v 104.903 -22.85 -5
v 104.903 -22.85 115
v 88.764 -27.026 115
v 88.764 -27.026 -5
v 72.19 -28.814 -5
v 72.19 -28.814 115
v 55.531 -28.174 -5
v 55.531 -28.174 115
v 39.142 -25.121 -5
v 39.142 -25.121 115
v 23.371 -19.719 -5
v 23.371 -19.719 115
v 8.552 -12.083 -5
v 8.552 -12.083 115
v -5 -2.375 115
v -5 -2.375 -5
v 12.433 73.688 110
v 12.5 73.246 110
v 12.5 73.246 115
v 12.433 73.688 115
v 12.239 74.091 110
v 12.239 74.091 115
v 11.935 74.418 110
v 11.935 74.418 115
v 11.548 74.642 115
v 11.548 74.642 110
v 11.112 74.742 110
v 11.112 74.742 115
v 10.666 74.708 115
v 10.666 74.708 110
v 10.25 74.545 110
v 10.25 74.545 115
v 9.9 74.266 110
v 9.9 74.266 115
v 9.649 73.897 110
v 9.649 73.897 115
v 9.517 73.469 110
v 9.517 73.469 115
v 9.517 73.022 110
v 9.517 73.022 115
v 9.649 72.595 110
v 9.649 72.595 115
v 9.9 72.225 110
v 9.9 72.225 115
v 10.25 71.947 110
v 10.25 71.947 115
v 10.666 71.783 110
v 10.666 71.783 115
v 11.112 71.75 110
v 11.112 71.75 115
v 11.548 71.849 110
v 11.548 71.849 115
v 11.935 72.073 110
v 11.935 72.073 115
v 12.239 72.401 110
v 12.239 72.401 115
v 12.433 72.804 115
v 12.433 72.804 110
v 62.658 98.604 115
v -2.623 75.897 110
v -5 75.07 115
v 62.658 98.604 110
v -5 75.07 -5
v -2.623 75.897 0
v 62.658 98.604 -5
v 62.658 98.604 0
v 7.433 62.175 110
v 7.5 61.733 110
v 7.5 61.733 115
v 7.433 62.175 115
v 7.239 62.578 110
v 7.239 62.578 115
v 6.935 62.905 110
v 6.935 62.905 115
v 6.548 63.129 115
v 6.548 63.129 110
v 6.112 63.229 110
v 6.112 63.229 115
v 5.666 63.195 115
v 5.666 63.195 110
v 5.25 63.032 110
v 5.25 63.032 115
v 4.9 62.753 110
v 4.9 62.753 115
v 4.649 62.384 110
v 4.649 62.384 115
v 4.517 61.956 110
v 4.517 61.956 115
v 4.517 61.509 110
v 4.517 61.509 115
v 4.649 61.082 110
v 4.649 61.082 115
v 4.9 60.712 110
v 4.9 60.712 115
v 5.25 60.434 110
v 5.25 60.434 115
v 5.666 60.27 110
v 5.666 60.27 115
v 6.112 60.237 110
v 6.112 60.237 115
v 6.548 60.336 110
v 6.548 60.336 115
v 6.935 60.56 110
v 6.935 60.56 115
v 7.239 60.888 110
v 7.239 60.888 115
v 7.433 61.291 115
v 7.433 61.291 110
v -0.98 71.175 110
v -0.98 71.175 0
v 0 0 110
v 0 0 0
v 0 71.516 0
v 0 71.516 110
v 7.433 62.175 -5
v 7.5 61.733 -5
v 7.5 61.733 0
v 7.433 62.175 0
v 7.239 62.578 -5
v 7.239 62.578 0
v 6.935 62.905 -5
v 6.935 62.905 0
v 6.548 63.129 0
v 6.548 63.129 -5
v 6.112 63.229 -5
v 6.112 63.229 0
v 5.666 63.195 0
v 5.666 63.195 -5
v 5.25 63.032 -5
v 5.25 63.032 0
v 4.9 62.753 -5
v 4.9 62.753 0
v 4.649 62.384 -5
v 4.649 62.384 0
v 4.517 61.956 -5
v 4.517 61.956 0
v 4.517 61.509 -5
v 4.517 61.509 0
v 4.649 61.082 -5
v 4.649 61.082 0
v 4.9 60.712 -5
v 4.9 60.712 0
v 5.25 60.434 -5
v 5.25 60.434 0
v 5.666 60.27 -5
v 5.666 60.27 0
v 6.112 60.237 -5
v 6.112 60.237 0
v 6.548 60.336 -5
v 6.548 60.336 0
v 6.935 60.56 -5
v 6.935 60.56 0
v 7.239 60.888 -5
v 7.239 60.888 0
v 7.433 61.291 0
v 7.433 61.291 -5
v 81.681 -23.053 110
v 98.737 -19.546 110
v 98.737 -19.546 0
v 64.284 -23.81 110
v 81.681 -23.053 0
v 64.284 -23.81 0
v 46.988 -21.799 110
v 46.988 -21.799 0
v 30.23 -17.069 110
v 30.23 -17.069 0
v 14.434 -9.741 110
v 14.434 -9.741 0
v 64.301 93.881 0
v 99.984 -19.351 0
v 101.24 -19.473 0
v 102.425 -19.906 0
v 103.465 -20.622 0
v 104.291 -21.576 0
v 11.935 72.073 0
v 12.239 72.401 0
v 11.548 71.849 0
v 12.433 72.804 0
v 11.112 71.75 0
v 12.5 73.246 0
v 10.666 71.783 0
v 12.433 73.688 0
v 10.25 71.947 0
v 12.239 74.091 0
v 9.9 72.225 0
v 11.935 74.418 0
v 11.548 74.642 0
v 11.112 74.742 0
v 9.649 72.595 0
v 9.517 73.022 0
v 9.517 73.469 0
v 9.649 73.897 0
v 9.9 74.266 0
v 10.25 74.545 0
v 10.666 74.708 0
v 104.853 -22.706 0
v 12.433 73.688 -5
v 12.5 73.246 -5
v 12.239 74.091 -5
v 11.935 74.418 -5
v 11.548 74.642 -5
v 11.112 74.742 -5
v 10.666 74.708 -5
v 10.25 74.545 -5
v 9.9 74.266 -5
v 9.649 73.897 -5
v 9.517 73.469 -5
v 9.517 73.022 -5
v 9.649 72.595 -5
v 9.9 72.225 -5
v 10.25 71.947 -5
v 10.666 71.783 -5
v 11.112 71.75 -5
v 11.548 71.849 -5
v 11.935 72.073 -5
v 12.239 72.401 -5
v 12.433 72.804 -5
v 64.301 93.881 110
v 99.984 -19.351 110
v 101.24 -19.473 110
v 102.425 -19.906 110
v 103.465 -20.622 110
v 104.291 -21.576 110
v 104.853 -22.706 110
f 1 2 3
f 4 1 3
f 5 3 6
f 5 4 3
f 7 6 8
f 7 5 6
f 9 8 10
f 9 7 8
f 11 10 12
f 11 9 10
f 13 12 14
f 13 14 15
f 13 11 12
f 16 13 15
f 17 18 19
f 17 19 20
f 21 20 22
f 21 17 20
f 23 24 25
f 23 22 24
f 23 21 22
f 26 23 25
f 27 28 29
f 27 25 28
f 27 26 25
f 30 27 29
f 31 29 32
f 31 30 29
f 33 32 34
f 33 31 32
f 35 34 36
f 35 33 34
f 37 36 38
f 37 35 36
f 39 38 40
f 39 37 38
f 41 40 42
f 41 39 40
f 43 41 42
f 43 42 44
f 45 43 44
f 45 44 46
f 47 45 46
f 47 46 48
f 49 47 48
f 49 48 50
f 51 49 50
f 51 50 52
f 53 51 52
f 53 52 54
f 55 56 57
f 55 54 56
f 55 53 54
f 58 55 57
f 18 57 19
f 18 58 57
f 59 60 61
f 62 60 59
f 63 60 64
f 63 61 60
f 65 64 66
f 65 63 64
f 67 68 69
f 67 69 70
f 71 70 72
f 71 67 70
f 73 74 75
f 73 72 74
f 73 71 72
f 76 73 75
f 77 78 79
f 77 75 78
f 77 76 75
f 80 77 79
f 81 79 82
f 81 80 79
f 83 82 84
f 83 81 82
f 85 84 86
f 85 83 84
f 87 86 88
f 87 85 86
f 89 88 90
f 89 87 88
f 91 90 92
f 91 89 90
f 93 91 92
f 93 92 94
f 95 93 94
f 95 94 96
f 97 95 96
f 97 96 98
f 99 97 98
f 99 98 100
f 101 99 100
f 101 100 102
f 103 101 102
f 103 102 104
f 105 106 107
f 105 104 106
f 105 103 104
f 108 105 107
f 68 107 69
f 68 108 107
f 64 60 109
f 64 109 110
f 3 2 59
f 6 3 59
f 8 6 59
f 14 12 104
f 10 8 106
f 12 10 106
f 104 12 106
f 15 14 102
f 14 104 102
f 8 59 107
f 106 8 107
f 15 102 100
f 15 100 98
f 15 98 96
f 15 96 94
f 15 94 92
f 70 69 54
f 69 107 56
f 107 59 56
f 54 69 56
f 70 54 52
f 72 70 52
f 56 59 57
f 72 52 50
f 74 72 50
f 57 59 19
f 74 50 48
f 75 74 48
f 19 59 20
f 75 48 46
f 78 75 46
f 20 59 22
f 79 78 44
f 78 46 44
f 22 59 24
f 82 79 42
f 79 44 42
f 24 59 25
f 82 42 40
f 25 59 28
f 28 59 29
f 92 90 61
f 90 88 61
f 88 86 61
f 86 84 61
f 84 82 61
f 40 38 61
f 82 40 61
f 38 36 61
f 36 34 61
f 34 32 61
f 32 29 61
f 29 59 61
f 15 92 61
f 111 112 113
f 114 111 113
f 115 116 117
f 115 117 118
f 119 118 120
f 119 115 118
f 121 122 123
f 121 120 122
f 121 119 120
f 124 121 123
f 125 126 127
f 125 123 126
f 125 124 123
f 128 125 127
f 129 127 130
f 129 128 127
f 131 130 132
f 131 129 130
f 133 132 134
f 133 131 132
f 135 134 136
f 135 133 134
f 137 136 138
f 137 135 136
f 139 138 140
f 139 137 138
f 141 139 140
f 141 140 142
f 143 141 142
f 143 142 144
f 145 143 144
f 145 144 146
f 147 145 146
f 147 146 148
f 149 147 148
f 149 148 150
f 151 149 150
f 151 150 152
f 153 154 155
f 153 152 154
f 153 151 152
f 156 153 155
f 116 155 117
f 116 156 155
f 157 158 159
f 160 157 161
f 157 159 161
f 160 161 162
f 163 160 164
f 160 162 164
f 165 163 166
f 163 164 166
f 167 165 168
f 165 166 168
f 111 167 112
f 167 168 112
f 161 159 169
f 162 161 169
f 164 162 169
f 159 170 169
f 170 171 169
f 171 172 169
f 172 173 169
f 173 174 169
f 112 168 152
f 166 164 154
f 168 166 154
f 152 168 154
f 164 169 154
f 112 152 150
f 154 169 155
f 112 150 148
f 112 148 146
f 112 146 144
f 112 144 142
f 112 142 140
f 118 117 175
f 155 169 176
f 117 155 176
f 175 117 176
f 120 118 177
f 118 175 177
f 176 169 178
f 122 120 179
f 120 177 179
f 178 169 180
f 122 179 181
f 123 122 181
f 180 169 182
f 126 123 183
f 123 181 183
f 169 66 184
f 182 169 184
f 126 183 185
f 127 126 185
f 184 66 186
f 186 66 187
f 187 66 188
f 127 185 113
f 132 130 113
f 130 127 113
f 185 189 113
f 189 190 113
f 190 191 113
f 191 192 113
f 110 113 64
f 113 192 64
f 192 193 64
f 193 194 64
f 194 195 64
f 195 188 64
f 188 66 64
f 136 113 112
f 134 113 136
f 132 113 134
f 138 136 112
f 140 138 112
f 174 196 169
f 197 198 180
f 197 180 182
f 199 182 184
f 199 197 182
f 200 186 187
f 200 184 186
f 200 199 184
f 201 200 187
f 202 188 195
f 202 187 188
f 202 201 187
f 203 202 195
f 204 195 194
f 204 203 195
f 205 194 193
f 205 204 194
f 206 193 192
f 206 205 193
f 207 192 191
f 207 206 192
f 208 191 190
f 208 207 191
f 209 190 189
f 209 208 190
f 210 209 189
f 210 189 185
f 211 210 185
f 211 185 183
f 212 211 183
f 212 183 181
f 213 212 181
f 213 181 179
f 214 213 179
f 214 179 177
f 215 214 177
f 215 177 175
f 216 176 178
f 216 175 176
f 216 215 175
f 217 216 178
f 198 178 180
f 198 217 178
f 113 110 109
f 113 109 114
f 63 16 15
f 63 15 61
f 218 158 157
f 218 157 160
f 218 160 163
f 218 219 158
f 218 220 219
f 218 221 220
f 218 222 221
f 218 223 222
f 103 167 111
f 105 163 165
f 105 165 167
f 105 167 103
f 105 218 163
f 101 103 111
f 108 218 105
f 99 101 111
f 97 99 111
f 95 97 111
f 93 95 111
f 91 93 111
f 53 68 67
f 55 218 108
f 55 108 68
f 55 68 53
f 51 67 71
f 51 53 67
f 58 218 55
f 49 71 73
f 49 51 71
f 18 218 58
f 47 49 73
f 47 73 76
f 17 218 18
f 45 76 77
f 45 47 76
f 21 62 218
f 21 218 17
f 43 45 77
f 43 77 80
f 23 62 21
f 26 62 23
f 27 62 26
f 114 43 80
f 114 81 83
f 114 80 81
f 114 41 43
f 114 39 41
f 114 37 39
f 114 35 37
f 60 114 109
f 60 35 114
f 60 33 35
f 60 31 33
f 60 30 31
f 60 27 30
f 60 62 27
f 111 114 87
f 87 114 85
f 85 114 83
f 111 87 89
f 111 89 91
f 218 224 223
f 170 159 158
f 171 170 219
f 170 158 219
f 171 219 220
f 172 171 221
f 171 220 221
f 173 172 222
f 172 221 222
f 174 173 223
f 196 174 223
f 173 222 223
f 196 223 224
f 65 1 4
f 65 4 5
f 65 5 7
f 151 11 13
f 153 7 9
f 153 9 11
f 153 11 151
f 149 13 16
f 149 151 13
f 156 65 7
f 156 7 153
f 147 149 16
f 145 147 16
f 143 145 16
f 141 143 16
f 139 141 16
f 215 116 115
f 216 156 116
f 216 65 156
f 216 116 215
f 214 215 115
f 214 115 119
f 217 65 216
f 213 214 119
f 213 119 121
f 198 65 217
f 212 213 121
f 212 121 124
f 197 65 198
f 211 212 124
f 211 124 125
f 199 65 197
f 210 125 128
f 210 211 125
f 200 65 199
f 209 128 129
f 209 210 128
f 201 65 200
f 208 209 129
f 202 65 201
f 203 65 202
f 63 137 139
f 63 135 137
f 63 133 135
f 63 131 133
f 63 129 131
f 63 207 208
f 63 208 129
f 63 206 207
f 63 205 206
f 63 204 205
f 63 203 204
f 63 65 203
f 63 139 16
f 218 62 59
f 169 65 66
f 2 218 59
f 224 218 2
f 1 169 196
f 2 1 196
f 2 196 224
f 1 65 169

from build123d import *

# Parameters (mm, degrees)
EXTRUDE_2_DEPTH          = 110
SHELL_5_T                = 5
SKETCH_2_W               = 69.117640956
SKETCH_2_H               = 110
CUT_EXTRUDE_2_DEPTH      = 5
CUT_EXTRUDE_5_DEPTH      = 188.422981916
CUT_EXTRUDE_5_DEPTH_BACK = 188.422981916
SKETCH_3_R               = 1.5
FILLET_2_R               = 5


with BuildPart() as part:
    # 草图1 → 凸台-拉伸2 (new body)
    with BuildSketch(Plane.XY):
        with BuildLine():
            Line((0, 0), (0, 71.515747703))
            Line((0, 71.515747703), (64.301044277, 93.881328321))
            Line((64.301044277, 93.881328321), (103.260442774, -18.126942356))
            ThreePointArc((103.260442774, -18.126942356), (49.31823123, -22.233763367), (0, 0))
        make_face()
    extrude(amount=EXTRUDE_2_DEPTH)

    # 抽壳5
    shell_5_openings = [part.faces().sort_by_distance(p)[0] for p in [
        (83.780743525, 37.877192982, 55),
    ]]
    offset(amount=SHELL_5_T, openings=shell_5_openings, kind=Kind.INTERSECTION)

    # 草图2 → 切除-拉伸2 (cut)
    with BuildSketch(Plane(origin=(-23.832986898, 68.51983733, 0), x_dir=(0.9444967967061592, 0.32852062494127277, 0), z_dir=(-0.3285206249412727, 0.944496796706159, 0))):
        with Locations((57.015262517, -55)):
            Rectangle(SKETCH_2_W, SKETCH_2_H)
    extrude(amount=-CUT_EXTRUDE_2_DEPTH, mode=Mode.SUBTRACT)

    # 草图3 → 切除-拉伸5 (cut, two sides: drawn at the far end of the back side and taken through both)
    with BuildSketch(Plane.XY.offset(115).offset(-CUT_EXTRUDE_5_DEPTH_BACK)):
        with Locations((11, 73.245743445)):
            Circle(SKETCH_3_R)
        with Locations((6, 61.732695858)):
            Circle(SKETCH_3_R)
    extrude(amount=CUT_EXTRUDE_5_DEPTH + CUT_EXTRUDE_5_DEPTH_BACK, mode=Mode.SUBTRACT)

    # 圆角2
    fillet_2_edges = [part.edges().sort_by_distance(p)[0] for p in [
        (103.260442774, -18.126942356, 55),
    ]]
    fillet(fillet_2_edges, radius=FILLET_2_R)


solid = part.part
